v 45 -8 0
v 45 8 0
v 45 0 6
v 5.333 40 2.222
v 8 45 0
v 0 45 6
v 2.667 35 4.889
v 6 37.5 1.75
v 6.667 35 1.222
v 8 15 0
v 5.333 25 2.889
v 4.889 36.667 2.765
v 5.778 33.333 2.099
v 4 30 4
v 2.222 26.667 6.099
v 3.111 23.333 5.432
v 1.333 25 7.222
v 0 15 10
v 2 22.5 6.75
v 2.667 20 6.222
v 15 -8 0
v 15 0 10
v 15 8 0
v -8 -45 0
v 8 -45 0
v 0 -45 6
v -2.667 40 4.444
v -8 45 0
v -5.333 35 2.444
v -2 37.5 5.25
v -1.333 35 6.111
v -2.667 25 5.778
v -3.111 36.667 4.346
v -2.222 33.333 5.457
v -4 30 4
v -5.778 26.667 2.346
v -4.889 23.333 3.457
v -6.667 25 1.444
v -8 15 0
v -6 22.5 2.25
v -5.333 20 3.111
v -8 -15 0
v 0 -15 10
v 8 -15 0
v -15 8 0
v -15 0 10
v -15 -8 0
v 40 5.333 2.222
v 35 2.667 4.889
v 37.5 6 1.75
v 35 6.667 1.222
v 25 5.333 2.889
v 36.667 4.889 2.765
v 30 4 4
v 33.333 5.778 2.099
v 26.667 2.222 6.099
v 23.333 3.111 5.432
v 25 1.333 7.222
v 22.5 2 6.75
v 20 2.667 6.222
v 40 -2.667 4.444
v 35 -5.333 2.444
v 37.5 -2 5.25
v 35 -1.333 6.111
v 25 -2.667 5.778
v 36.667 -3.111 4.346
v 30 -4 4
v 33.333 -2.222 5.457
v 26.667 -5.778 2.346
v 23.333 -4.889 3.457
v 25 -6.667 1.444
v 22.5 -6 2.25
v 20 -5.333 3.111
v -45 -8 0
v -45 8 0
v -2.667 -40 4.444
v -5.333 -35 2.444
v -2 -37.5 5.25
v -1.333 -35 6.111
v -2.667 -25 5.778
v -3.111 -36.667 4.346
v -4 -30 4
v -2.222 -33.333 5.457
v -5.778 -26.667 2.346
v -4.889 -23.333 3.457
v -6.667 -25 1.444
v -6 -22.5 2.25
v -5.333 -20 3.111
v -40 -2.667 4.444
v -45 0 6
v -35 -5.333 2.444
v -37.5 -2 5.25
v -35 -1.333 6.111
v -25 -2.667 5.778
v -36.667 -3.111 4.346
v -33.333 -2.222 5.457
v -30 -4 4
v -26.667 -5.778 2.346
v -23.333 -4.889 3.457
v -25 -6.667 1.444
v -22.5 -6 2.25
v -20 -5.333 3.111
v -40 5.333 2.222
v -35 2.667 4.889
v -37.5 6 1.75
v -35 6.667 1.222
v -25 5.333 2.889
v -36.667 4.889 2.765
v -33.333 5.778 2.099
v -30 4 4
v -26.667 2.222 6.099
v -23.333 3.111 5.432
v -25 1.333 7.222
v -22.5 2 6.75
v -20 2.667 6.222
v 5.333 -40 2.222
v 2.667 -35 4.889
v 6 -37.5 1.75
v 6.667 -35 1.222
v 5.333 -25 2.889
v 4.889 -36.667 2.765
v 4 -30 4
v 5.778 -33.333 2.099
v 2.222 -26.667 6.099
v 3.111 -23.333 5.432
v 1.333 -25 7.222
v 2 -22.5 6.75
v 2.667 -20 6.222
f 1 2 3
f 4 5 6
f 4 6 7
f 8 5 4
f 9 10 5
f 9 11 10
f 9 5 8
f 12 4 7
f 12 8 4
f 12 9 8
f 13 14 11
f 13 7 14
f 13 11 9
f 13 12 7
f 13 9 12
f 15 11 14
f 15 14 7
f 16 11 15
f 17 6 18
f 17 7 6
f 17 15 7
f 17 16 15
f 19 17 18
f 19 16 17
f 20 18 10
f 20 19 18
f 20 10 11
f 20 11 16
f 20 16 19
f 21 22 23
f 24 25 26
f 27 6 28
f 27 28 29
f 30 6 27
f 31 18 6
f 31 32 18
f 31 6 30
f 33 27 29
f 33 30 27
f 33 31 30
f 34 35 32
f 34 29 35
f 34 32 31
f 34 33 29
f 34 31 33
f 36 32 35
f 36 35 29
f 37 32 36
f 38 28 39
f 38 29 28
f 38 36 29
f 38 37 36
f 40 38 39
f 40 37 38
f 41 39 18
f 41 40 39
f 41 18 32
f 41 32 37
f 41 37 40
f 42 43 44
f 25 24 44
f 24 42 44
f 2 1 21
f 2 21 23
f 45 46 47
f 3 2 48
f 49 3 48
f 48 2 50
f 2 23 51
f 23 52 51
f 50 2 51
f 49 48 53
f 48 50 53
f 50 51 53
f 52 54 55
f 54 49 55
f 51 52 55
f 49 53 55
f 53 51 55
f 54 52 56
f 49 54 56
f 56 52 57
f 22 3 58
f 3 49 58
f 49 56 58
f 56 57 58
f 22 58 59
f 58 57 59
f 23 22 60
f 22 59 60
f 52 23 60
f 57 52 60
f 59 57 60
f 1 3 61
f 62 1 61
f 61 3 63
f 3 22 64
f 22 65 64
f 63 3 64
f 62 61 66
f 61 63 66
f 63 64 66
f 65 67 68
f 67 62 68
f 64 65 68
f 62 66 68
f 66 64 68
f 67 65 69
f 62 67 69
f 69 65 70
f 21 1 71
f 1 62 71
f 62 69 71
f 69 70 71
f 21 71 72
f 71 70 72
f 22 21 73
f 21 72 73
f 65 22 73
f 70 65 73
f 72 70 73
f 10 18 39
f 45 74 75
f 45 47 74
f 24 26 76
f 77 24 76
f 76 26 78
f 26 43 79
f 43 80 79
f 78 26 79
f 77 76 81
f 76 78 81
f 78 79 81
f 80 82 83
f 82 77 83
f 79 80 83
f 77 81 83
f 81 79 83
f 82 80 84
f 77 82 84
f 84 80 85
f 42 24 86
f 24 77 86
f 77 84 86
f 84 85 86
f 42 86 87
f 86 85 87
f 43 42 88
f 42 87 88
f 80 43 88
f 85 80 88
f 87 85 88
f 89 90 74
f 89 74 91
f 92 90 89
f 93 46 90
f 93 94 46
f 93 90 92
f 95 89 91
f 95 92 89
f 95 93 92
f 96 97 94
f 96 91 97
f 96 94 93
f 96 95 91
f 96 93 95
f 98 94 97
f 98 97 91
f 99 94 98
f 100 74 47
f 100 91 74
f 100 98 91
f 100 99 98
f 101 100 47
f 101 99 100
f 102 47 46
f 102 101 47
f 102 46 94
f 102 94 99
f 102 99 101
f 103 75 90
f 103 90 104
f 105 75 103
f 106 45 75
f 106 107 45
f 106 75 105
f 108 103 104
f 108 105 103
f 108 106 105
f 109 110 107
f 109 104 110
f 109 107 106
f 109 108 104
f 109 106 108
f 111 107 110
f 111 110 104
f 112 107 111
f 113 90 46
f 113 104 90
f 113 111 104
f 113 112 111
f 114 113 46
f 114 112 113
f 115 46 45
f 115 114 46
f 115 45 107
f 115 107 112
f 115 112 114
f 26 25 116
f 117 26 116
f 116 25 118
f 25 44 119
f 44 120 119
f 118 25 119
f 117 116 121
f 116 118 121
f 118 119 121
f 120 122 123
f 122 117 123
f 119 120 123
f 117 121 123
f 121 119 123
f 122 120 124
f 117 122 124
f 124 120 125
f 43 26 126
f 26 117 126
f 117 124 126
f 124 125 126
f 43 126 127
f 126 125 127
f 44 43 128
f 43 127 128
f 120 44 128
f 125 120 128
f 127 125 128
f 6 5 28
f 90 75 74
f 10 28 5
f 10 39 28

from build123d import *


with BuildPart() as f4:
    # F1 (on offset) → F4 section 0
    with BuildSketch(Plane.XZ.offset(45)):
        Polygon((0, 6), (-8, 0), (8, 0), align=None)
    # F3 (on offset) → F4 section 1
    with BuildSketch(Plane.XZ.offset(15)):
        Polygon((0, 10), (-8, 0), (8, 0), align=None)
    loft()


with BuildPart() as f5_1:
    # F5: instance of F4
    add(f4.part.mirror(Plane.XZ))


with BuildPart() as f8_1:
    # F8: instance of F4
    add(f4.part.mirror(Plane(origin=(0, 0, 0), x_dir=(-0.7071067812, -0.7071067812, 0), z_dir=(-0.7071067812, 0.7071067812, 0))))


with BuildPart() as f8_2:
    # F8: instance of F5_1
    add(f5_1.part.mirror(Plane(origin=(0, 0, 0), x_dir=(-0.7071067812, -0.7071067812, 0), z_dir=(-0.7071067812, 0.7071067812, 0))))


solid = Compound([f4.part, f5_1.part, f8_1.part, f8_2.part])
